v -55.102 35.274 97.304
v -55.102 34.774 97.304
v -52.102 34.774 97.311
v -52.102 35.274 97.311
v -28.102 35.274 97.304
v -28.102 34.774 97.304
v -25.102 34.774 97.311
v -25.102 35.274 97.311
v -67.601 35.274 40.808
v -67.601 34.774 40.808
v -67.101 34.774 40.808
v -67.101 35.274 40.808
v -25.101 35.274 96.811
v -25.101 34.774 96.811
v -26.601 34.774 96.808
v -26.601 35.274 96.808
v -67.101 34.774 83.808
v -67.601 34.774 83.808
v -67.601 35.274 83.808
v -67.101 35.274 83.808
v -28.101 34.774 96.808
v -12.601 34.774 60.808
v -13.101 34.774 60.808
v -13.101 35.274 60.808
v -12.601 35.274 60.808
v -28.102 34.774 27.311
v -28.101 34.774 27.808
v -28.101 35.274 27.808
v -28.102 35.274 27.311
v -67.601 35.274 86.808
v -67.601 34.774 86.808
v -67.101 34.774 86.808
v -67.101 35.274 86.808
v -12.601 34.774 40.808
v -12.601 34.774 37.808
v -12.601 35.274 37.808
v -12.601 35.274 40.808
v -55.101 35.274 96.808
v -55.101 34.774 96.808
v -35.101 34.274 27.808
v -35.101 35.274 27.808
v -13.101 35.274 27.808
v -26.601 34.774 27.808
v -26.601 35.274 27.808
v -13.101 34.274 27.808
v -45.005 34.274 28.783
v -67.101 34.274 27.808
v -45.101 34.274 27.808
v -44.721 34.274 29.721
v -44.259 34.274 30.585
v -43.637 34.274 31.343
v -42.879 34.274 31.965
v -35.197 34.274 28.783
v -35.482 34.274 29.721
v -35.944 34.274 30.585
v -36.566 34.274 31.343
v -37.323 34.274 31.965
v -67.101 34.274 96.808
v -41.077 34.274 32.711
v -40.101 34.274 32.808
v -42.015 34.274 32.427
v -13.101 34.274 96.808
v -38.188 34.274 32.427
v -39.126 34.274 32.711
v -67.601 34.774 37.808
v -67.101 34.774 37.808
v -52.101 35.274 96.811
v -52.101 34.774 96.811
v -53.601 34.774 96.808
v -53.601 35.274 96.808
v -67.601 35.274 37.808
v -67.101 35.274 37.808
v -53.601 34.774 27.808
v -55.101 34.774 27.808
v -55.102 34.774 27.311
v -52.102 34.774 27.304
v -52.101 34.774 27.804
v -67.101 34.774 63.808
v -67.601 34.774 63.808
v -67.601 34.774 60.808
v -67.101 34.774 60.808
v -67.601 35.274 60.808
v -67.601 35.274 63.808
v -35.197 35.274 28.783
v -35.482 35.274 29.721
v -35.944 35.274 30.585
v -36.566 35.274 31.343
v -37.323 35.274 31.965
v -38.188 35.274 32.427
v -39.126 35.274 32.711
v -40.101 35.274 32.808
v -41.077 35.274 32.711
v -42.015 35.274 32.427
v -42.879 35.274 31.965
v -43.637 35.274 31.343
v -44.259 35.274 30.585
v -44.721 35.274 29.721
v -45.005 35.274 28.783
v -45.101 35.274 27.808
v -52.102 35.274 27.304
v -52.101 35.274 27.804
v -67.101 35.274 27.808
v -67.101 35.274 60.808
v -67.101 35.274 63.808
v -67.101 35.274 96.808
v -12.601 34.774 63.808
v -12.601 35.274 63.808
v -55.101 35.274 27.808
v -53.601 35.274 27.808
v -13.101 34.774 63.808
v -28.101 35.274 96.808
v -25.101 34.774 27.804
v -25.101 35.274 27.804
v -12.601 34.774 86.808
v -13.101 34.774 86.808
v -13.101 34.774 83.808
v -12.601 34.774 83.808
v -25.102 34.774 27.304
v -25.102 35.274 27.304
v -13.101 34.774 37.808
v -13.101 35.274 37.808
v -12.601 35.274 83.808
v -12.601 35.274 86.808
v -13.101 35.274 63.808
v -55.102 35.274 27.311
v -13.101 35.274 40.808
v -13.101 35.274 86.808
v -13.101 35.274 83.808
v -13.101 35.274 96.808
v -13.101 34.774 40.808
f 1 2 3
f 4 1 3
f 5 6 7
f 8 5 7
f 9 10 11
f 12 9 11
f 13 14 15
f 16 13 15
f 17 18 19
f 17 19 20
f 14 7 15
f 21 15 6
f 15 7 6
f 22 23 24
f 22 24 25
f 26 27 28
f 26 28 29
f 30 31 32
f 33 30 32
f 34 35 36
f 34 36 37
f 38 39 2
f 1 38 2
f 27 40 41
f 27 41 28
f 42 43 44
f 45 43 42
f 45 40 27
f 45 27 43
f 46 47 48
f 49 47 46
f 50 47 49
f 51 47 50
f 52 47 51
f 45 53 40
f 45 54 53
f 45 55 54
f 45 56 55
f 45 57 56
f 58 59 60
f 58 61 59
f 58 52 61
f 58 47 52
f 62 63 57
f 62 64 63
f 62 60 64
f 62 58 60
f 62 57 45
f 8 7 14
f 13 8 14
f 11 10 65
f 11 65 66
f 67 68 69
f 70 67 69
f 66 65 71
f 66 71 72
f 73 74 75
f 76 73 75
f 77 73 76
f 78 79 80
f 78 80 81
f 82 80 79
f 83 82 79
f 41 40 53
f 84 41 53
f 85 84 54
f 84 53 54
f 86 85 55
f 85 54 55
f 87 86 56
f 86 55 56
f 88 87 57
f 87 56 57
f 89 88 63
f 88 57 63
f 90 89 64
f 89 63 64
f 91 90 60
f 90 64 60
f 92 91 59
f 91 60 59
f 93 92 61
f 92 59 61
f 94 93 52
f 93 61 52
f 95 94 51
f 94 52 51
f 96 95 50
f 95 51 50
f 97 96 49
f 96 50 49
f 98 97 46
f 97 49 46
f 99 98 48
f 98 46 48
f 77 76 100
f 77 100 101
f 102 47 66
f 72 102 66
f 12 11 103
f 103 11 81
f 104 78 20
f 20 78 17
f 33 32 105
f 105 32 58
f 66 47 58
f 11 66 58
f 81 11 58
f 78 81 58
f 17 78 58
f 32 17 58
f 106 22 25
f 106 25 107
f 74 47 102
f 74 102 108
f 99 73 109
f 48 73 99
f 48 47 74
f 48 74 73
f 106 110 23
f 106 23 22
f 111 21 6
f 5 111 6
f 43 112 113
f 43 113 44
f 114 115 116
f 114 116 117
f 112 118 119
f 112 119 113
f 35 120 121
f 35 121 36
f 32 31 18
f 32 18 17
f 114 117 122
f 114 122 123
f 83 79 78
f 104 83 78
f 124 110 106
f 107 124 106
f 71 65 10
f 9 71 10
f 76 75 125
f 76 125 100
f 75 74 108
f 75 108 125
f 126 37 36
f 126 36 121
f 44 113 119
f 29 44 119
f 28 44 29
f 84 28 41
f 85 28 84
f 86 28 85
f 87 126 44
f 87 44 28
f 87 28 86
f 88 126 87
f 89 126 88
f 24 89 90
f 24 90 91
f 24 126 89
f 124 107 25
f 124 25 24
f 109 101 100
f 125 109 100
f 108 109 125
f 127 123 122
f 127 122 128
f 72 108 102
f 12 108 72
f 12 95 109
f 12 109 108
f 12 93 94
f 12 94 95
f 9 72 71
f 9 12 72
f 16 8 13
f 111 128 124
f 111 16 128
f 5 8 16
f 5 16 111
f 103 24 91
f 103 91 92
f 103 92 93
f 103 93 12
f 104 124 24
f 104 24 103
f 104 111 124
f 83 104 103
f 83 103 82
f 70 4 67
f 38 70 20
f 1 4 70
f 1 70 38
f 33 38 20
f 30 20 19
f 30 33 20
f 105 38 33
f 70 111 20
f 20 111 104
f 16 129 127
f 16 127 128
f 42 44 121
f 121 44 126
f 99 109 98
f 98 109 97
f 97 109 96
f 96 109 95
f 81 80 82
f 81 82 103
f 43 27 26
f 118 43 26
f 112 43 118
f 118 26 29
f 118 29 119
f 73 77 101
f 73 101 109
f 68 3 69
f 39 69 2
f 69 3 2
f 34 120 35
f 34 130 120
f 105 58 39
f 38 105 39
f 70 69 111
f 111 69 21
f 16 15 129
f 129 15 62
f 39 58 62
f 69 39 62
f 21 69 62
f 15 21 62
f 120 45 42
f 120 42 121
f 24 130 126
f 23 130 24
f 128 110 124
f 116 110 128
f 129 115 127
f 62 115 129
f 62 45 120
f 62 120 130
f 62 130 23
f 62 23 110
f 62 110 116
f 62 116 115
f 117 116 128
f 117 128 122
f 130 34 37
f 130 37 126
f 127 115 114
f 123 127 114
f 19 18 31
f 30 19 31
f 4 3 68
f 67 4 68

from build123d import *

# Parameters (mm, degrees)
SKETCH1_W           = 54
SKETCH1_H           = 69
BOSS_EXTRUDE1_DEPTH = 1
BOSS_EXTRUDE2_START = -0.5
SKETCH3_W           = 0.5
SKETCH3_H           = 3
BOSS_EXTRUDE2_DEPTH = 0.5
SKETCH4_R           = 5
CUT_EXTRUDE1_DEPTH  = 1


with BuildPart() as part:
    # Sketch1 → Boss-Extrude1 (new body)
    with BuildSketch(Plane.XZ.offset(-34.2740501)):
        with Locations((-40.101257217, 62.307503177)):
            Rectangle(SKETCH1_W, SKETCH1_H)
    extrude(amount=-BOSS_EXTRUDE1_DEPTH)

    # Sketch3 → Boss-Extrude2 (add)
    with BuildSketch(Plane.XZ.offset(-34.2740501).offset(BOSS_EXTRUDE2_START)):
        with Locations((-67.351257217, 85.307503177)):
            Rectangle(SKETCH3_W, SKETCH3_H)
        with Locations((-12.851257217, 85.307503177)):
            Rectangle(SKETCH3_W, SKETCH3_H)
        with Locations((-12.851257217, 62.307503177)):
            Rectangle(SKETCH3_W, SKETCH3_H)
        Polygon((-13.101257217, 39.307503177), (-13.101257217, 37.807503177), (-12.601257217, 37.807503177), (-12.601257217, 40.807503177), (-13.101257217, 40.807503177), align=None)
        Polygon((-25.101261235, 27.80403111), (-26.601257217, 27.807503177), (-28.101261235, 27.807503177), (-28.102410554, 27.310976583), (-25.102418591, 27.304032449), align=None)
        Polygon((-52.101261235, 27.80403111), (-53.601257217, 27.807503177), (-55.101261235, 27.807503177), (-55.102410554, 27.310976583), (-52.102418591, 27.304032449), align=None)
        with Locations((-67.351257217, 39.307503177)):
            Rectangle(SKETCH3_W, SKETCH3_H)
        with Locations((-67.351257217, 62.307503177)):
            Rectangle(SKETCH3_W, SKETCH3_H)
        Polygon((-55.102410554, 97.30402977), (-52.102418591, 97.310973905), (-52.101261235, 96.810975244), (-55.101253198, 96.80403111), align=None)
        Polygon((-28.102410554, 97.30402977), (-25.102418591, 97.310973905), (-25.101261235, 96.810975244), (-28.101253198, 96.80403111), align=None)
    extrude(amount=-BOSS_EXTRUDE2_DEPTH)

    # Sketch4 → Cut-Extrude1 (cut)
    with BuildSketch(Plane.XZ.offset(-34.2740501)):
        with Locations((-40.101257217, 27.807503177)):
            Circle(SKETCH4_R)
    extrude(amount=-CUT_EXTRUDE1_DEPTH, mode=Mode.SUBTRACT)


solid = part.part
